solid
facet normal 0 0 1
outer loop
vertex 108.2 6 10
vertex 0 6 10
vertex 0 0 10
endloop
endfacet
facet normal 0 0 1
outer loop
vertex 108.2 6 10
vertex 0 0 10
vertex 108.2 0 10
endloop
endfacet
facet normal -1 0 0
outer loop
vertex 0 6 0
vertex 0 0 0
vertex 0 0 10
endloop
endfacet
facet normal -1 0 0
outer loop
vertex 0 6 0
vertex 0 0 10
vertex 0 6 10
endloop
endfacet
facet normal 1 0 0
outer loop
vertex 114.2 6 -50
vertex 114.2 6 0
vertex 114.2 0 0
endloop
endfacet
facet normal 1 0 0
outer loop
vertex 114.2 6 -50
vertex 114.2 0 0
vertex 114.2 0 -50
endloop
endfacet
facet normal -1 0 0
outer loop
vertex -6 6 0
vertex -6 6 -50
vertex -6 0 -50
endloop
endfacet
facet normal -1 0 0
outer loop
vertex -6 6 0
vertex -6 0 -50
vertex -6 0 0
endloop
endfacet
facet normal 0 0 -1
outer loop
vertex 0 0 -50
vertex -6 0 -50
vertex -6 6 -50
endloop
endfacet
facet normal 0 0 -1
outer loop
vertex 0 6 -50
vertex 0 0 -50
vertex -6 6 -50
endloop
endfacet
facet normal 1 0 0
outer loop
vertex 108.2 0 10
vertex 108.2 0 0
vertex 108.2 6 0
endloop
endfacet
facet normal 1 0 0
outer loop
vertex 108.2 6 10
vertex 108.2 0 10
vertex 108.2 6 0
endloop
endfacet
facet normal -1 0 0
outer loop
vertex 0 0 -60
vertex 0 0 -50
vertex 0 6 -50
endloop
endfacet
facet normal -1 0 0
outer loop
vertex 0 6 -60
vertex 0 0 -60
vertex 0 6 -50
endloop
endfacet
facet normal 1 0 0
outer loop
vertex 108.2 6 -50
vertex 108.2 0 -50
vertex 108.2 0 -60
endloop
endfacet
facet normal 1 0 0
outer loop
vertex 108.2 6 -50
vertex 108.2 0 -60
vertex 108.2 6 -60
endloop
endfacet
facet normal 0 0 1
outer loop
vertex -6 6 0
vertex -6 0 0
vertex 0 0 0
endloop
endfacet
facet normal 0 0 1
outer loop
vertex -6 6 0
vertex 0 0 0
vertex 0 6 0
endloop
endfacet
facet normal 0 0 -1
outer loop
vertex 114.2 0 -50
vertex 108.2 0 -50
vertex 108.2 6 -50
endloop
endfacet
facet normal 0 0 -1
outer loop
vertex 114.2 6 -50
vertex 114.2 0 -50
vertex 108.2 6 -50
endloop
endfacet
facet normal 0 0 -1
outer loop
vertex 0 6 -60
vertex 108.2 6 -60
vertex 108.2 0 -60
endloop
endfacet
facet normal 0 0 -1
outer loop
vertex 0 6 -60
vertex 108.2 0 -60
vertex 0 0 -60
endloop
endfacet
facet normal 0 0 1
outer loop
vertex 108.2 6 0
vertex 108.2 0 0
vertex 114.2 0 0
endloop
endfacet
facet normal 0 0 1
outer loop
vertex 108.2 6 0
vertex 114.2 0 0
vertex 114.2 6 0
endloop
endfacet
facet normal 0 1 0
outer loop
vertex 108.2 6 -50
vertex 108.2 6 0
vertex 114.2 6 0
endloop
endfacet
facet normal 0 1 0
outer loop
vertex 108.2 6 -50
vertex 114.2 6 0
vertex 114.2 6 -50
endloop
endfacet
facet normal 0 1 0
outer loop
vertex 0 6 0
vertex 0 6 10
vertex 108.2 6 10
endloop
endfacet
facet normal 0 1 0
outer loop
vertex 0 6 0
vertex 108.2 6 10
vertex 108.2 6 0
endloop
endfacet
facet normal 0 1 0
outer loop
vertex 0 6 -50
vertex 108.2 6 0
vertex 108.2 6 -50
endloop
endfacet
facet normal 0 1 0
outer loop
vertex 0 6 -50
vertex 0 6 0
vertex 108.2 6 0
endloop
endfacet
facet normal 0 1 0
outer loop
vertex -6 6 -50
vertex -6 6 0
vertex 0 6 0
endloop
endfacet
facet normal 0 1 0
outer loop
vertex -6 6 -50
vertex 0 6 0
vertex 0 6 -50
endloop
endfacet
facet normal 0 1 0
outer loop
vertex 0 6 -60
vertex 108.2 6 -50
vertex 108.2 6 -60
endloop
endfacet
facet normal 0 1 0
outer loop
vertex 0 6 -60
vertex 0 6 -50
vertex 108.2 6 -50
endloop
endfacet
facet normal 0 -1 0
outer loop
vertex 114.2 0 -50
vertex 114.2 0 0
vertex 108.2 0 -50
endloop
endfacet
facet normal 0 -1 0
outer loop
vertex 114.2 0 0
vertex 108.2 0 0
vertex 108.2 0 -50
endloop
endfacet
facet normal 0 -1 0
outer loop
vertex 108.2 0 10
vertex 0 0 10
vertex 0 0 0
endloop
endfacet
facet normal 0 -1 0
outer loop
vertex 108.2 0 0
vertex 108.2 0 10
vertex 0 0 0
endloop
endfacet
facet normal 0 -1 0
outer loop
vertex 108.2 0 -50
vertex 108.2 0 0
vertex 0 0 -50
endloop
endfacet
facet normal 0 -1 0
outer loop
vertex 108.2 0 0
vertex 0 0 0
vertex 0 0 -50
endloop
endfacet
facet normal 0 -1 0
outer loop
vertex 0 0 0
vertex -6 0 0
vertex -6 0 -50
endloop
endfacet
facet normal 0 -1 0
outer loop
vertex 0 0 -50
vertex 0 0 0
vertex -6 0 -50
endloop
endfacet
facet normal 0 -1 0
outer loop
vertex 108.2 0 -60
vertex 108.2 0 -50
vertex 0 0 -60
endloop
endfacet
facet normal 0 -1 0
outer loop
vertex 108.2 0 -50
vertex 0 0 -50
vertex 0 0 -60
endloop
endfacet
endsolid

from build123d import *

# Parameters (mm, degrees)
SKETCH1_W           = 108.2
SKETCH1_H           = 50
BOSS_EXTRUDE1_DEPTH = 6
SKETCH2_W           = 50
SKETCH2_H           = 6
BOSS_EXTRUDE2_DEPTH = 6
SKETCH3_W           = 50
SKETCH3_H           = 6
BOSS_EXTRUDE3_DEPTH = 6
SKETCH4_W           = 108.2
SKETCH4_H           = 6
BOSS_EXTRUDE4_DEPTH = 10
SKETCH5_W           = 108.2
SKETCH5_H           = 6
BOSS_EXTRUDE5_DEPTH = 10


with BuildPart() as part:
    # Sketch1 → Boss-Extrude1 (new body)
    with BuildSketch(Plane(origin=(0, 0, 0), x_dir=(1, 0, 0), z_dir=(0, 1, 0))):
        with Locations((54.1, 25)):
            Rectangle(SKETCH1_W, SKETCH1_H)
    extrude(amount=BOSS_EXTRUDE1_DEPTH)

    # Sketch2 → Boss-Extrude2 (add)
    with BuildSketch(Plane.ZY):
        with Locations((-25, 3)):
            Rectangle(SKETCH2_W, SKETCH2_H)
    extrude(amount=BOSS_EXTRUDE2_DEPTH)

    # Sketch3 → Boss-Extrude3 (add)
    with BuildSketch(Plane(origin=(108.2, 0, 0), x_dir=(0, 0, -1), z_dir=(1, 0, 0))):
        with Locations((25, 3)):
            Rectangle(SKETCH3_W, SKETCH3_H)
    extrude(amount=BOSS_EXTRUDE3_DEPTH)

    # Sketch4 → Boss-Extrude4 (add)
    with BuildSketch(Plane(origin=(0, 0, -50), x_dir=(-1, 0, 0), z_dir=(0, 0, -1))):
        with Locations((-54.1, 3)):
            Rectangle(SKETCH4_W, SKETCH4_H)
    extrude(amount=BOSS_EXTRUDE4_DEPTH)

    # Sketch5 → Boss-Extrude5 (add)
    with BuildSketch(Plane.XY):
        with Locations((54.1, 3)):
            Rectangle(SKETCH5_W, SKETCH5_H)
    extrude(amount=BOSS_EXTRUDE5_DEPTH)


solid = part.part
